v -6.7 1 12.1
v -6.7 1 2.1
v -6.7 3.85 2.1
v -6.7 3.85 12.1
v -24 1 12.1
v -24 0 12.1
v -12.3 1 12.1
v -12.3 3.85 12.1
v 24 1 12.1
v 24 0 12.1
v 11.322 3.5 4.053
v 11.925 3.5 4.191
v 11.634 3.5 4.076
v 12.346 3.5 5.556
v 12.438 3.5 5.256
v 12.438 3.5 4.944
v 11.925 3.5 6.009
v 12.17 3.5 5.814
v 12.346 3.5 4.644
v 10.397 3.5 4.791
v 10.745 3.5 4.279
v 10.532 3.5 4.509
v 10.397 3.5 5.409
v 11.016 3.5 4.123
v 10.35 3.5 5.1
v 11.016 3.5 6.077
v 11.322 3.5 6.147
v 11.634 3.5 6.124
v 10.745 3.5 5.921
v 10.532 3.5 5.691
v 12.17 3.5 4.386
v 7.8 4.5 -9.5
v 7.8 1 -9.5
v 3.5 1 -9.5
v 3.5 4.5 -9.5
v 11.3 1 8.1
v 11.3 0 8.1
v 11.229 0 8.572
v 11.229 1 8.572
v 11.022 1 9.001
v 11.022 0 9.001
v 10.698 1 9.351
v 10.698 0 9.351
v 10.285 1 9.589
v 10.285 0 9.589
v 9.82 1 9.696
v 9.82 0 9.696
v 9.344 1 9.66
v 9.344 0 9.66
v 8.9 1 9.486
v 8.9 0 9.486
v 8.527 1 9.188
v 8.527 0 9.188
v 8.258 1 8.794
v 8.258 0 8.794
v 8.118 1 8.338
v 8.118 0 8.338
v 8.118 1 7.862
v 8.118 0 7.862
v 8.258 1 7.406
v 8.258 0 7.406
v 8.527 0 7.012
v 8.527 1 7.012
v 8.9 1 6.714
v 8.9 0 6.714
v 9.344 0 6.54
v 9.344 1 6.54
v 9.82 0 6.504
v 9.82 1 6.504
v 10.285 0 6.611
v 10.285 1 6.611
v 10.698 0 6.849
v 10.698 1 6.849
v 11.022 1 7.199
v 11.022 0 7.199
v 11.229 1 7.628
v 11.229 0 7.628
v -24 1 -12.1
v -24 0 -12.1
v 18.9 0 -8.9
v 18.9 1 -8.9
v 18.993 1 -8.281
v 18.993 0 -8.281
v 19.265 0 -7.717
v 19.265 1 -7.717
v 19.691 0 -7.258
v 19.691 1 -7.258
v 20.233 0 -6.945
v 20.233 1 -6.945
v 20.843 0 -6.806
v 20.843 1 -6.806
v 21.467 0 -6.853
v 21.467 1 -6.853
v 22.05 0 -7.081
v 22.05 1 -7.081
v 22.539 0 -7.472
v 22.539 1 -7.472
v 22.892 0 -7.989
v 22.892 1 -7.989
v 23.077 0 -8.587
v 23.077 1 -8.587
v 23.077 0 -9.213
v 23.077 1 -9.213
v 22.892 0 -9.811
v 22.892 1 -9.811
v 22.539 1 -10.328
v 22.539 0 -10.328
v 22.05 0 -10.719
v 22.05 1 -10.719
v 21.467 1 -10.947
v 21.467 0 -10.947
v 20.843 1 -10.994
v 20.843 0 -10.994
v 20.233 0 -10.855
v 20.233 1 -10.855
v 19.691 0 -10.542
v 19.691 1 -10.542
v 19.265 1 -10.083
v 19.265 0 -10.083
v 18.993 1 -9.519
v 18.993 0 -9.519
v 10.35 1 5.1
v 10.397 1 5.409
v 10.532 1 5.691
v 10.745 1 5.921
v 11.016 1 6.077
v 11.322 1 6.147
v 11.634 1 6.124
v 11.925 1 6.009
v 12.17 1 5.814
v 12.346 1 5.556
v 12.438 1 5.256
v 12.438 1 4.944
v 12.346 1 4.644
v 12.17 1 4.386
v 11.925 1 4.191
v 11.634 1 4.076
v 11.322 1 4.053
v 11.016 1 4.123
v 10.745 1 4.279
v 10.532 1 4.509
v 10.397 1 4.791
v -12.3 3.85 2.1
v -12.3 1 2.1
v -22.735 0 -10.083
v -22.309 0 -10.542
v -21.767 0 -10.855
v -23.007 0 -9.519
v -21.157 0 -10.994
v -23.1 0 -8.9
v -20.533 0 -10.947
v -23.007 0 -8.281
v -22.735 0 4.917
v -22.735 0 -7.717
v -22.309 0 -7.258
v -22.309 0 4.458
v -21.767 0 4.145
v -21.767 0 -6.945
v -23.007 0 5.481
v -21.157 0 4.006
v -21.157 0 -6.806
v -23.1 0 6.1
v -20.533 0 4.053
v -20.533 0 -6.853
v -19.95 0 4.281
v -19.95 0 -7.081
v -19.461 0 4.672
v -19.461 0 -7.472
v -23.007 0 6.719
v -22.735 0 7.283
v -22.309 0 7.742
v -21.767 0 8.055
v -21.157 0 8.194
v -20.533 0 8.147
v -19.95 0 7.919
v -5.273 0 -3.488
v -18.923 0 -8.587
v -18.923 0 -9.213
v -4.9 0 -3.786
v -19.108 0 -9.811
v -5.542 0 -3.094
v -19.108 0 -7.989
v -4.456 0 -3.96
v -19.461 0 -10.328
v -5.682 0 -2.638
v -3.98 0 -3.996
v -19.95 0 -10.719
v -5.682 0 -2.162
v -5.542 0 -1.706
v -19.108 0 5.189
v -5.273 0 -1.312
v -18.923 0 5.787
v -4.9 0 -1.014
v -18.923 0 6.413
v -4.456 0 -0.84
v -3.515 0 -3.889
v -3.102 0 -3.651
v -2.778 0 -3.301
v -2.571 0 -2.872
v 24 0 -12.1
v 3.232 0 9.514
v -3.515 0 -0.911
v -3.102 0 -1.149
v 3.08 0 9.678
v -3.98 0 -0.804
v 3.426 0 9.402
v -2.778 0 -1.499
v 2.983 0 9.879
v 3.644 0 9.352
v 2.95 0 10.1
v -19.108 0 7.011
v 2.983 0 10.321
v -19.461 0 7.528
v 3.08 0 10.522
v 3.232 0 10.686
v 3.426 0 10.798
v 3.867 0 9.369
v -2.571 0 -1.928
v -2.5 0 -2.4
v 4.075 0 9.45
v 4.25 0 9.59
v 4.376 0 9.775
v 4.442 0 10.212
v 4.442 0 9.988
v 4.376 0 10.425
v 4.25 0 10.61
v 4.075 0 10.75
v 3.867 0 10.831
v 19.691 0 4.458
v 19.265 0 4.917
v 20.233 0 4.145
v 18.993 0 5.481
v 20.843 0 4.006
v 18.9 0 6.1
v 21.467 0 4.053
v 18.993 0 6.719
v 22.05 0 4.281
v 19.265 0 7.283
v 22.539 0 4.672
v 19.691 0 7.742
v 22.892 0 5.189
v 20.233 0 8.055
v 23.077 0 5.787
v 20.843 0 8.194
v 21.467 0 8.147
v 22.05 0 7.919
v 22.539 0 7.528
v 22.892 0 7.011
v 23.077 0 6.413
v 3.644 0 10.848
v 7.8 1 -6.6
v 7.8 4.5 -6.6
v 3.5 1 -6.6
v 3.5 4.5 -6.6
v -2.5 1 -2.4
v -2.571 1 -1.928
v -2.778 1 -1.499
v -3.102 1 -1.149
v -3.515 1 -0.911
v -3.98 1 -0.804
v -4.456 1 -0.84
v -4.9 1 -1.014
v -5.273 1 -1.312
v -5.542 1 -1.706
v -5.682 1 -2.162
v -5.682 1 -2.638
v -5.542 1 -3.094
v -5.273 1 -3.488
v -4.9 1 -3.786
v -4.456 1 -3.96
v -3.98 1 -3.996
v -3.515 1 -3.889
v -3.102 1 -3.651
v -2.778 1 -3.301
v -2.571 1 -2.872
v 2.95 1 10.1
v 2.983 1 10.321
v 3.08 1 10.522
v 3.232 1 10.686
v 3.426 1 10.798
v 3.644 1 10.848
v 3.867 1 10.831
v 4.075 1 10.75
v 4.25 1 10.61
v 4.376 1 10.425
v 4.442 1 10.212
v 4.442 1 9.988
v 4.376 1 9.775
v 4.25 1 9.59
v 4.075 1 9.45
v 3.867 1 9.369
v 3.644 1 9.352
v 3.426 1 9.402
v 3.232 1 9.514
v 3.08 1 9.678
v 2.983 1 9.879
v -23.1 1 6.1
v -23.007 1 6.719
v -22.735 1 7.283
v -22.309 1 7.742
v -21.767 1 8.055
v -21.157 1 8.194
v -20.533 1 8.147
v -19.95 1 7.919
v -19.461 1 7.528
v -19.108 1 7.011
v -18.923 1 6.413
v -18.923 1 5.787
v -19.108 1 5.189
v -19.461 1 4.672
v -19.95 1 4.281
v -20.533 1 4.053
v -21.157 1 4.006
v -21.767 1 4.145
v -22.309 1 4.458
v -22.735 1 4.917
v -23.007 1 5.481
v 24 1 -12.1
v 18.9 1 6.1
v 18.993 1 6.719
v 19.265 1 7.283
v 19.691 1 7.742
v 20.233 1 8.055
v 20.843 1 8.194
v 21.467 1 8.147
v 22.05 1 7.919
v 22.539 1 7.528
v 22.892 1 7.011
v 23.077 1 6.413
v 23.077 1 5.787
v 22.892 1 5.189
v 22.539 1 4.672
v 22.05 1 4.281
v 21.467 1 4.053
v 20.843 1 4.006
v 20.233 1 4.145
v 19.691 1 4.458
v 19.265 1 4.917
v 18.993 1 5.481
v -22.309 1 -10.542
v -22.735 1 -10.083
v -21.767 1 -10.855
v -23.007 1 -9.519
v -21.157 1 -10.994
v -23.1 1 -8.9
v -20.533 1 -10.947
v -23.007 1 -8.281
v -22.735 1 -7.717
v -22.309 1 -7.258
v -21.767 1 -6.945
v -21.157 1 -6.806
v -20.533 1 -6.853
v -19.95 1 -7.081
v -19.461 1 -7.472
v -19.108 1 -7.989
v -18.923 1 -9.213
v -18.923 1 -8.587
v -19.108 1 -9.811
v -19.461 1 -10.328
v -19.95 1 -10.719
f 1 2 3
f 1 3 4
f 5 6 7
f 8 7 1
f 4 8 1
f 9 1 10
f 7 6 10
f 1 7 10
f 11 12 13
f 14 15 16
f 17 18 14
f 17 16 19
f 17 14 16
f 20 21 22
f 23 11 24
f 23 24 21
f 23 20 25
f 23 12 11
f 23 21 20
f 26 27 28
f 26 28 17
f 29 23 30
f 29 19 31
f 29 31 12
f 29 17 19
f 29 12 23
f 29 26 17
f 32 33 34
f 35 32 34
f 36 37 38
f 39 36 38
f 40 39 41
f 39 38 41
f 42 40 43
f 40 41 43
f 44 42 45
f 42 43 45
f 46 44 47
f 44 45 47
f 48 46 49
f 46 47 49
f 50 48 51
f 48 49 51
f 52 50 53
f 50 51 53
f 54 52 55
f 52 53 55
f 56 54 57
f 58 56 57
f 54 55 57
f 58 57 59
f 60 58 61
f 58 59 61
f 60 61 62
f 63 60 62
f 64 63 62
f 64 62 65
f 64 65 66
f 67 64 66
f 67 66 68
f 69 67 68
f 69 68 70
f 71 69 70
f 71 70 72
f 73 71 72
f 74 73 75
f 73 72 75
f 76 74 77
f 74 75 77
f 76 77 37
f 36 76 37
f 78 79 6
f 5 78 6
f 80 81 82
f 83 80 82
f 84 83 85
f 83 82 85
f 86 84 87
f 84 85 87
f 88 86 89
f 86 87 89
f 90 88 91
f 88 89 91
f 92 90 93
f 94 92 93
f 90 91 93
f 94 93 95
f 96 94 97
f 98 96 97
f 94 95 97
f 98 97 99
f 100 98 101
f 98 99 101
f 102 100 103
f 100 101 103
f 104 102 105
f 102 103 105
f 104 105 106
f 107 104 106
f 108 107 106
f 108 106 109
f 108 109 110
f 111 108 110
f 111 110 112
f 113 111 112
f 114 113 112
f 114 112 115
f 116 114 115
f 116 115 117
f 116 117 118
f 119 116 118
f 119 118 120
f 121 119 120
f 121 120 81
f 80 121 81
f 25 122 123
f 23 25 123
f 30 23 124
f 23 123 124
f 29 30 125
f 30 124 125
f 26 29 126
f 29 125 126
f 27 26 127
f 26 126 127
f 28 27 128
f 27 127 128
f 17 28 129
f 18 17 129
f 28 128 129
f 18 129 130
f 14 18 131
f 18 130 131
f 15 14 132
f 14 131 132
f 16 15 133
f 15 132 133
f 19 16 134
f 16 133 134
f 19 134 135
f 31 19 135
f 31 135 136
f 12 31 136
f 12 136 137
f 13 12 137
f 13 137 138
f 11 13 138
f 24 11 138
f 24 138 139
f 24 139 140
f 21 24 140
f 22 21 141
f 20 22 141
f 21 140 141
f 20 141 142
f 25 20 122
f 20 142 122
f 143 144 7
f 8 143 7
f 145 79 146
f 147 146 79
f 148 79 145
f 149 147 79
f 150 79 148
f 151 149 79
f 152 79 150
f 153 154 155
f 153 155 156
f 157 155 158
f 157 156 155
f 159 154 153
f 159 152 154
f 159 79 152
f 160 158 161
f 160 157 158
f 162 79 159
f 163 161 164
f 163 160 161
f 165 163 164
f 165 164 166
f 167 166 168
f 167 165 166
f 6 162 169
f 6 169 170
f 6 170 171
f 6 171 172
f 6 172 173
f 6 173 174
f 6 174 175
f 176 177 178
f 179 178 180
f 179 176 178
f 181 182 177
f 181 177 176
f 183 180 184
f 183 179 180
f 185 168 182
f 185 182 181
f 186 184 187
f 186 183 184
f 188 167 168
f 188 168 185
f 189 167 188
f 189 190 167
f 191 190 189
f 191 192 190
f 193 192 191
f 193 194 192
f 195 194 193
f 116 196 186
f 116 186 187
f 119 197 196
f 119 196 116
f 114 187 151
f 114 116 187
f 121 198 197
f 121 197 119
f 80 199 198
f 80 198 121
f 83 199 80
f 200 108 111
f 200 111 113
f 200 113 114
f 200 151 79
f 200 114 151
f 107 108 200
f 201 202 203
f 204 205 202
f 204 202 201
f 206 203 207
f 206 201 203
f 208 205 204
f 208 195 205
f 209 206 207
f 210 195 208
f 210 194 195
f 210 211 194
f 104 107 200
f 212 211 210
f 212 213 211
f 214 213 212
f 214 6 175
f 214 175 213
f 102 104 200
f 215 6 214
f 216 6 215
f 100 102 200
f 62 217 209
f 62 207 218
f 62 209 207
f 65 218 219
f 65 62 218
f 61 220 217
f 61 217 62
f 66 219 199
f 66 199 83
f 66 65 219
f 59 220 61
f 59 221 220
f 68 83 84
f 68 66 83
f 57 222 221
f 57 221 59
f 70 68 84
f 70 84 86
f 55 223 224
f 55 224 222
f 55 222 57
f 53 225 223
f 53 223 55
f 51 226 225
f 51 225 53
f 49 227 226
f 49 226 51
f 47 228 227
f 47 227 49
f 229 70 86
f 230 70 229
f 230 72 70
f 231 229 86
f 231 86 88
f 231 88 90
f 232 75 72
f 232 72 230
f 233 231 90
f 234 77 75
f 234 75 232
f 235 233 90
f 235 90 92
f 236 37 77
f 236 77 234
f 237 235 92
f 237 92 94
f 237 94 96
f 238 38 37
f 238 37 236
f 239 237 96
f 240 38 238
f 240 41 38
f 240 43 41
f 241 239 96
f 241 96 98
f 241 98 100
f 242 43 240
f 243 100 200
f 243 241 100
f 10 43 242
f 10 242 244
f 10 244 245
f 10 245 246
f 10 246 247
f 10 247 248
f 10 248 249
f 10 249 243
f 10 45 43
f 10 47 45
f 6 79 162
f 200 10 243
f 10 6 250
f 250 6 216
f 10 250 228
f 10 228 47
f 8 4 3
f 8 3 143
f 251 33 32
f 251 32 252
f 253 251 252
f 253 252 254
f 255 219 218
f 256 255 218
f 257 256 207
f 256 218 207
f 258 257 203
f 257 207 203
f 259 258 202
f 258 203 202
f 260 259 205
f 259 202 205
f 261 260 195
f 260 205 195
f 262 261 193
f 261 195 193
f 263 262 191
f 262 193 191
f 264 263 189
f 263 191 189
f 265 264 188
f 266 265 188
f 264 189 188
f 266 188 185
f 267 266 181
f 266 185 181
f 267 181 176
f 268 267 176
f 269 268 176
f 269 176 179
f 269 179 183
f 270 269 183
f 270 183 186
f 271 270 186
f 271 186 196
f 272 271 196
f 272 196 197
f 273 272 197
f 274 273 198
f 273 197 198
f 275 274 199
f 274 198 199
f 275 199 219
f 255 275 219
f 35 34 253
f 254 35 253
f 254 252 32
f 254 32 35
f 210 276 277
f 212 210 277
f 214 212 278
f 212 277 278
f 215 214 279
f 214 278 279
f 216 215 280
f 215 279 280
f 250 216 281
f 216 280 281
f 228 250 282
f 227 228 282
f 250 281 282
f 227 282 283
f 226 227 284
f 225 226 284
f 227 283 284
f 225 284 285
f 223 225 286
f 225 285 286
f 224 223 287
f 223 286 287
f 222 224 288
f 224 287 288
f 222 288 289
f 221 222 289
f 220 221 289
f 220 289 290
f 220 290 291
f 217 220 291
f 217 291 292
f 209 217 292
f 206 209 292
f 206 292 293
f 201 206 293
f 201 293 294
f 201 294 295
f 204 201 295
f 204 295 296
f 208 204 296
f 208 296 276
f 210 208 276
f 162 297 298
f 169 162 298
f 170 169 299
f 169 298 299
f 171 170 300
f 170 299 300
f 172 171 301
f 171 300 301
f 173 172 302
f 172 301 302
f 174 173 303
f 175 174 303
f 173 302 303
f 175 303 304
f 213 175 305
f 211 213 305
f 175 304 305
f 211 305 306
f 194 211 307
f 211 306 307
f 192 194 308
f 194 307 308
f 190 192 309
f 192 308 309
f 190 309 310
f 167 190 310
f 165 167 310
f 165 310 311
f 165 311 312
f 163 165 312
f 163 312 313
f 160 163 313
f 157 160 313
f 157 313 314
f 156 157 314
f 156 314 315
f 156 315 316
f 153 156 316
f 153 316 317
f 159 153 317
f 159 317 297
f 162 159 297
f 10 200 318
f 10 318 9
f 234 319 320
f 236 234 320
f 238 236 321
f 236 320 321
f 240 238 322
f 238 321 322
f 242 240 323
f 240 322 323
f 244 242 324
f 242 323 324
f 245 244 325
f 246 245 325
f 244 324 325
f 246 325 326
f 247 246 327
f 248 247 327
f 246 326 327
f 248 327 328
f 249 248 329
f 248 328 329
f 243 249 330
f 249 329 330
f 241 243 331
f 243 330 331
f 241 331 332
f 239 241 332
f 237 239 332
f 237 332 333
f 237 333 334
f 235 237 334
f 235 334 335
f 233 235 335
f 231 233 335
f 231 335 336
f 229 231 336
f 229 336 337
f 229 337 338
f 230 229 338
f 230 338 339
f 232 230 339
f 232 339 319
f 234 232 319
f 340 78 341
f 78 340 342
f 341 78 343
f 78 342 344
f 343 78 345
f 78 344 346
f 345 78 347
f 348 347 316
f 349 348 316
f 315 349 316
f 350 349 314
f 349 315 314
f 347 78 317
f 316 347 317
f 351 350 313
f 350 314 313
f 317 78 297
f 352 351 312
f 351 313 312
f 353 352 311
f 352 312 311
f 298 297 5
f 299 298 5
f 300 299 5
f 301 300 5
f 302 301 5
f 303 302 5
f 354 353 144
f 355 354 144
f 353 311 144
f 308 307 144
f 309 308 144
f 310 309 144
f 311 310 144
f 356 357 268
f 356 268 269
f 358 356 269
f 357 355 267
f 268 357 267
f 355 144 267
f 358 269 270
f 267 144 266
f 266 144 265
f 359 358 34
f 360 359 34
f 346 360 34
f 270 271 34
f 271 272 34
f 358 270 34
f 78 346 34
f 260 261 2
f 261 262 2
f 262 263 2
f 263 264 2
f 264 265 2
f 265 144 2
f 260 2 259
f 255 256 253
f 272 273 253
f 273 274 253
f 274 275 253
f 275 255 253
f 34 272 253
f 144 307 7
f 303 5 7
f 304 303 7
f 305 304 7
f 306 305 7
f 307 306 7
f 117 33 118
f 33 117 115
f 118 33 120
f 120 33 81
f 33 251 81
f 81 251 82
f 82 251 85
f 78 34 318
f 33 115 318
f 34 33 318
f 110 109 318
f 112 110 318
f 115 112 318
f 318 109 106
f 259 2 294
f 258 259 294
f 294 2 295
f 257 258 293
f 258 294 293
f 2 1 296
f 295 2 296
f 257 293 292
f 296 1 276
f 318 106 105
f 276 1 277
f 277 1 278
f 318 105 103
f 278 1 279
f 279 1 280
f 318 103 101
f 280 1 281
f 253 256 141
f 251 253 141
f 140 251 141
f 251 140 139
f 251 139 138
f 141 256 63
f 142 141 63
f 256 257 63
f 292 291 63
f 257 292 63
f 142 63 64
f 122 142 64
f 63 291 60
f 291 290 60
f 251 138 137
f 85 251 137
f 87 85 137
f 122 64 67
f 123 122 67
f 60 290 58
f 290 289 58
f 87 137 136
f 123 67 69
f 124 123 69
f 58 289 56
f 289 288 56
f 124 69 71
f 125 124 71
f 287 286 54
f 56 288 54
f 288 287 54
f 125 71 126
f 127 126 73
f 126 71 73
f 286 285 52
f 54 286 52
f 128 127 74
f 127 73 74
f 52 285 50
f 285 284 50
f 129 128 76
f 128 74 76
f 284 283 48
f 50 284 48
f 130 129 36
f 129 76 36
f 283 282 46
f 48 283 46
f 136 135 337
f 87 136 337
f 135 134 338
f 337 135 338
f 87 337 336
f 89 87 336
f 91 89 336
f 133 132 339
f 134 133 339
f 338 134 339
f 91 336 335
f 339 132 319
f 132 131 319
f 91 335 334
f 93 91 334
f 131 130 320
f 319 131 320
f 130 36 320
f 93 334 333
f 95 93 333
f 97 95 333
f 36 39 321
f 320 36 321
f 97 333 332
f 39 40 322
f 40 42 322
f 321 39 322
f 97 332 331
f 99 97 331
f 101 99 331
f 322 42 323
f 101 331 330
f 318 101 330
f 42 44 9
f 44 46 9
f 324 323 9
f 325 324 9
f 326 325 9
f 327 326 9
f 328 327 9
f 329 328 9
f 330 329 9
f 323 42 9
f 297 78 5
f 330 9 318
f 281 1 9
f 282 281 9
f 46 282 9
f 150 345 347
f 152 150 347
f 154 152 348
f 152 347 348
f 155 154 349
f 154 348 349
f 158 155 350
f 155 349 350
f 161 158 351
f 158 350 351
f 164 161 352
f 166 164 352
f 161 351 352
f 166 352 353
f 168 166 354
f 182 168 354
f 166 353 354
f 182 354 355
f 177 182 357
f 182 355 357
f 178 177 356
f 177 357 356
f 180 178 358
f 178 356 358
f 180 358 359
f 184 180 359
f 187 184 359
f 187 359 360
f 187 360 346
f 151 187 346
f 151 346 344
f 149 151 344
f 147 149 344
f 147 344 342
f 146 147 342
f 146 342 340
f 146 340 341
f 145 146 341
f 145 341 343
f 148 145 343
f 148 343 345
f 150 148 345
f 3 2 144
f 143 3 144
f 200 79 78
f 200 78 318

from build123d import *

# Parameters (mm, degrees)
F0_W     = 48
F0_H     = 24.2
F0_R     = 1.6
F1_DEPTH = 1
F2_R     = 1.05
F3_DEPTH = 2.5
F2_R_2   = 2.1
F2_R_3   = 0.75
F4_DEPTH = 1.001
F5_W     = 5.6
F5_H     = 10
F6_DEPTH = 2.85
F2_W     = 4.3
F2_H     = 2.9
F7_DEPTH = 3.5


with BuildPart() as f1:
    # F0 (on Front) → F1 (new body)
    with BuildSketch(Plane.XZ):
        Rectangle(F0_W, F0_H)
        with Locations((-4.1, -2.4)):
            Circle(F0_R, mode=Mode.SUBTRACT)
        with Locations((9.7, 8.1)):
            Circle(F0_R, mode=Mode.SUBTRACT)
    extrude(amount=-F1_DEPTH)

    # F2 (on face) → F3 (join)
    with BuildSketch(Plane(origin=(0, 1, 0), x_dir=(-1, 0, 0), z_dir=(0, 1, 0))):
        with Locations((-11.4, 5.1)):
            Circle(F2_R)
    extrude(amount=F3_DEPTH)

    # F2 (on face) → F4 (cut, through all)
    with BuildSketch(Plane(origin=(0, 1, 0), x_dir=(-1, 0, 0), z_dir=(0, 1, 0))):
        with Locations((-21, 6.1)):
            Circle(F2_R_2)
        with Locations((-21, -8.9)):
            Circle(F2_R_2)
        with Locations((21, 6.1)):
            Circle(F2_R_2)
        with Locations((21, -8.9)):
            Circle(F2_R_2)
        with Locations((-3.7, 10.1)):
            Circle(F2_R_3)
    extrude(amount=-F4_DEPTH, mode=Mode.SUBTRACT)

    # F5 (on face) → F6 (join)
    with BuildSketch(Plane(origin=(0, 1, 0), x_dir=(-1, 0, 0), z_dir=(0, 1, 0))):
        with Locations((9.5, 7.1)):
            Rectangle(F5_W, F5_H)
    extrude(amount=F6_DEPTH)

    # F2 (on face) → F7 (join)
    with BuildSketch(Plane(origin=(0, 1, 0), x_dir=(-1, 0, 0), z_dir=(0, 1, 0))):
        with Locations((-5.65, -8.05)):
            Rectangle(F2_W, F2_H)
    extrude(amount=F7_DEPTH)


solid = f1.part
